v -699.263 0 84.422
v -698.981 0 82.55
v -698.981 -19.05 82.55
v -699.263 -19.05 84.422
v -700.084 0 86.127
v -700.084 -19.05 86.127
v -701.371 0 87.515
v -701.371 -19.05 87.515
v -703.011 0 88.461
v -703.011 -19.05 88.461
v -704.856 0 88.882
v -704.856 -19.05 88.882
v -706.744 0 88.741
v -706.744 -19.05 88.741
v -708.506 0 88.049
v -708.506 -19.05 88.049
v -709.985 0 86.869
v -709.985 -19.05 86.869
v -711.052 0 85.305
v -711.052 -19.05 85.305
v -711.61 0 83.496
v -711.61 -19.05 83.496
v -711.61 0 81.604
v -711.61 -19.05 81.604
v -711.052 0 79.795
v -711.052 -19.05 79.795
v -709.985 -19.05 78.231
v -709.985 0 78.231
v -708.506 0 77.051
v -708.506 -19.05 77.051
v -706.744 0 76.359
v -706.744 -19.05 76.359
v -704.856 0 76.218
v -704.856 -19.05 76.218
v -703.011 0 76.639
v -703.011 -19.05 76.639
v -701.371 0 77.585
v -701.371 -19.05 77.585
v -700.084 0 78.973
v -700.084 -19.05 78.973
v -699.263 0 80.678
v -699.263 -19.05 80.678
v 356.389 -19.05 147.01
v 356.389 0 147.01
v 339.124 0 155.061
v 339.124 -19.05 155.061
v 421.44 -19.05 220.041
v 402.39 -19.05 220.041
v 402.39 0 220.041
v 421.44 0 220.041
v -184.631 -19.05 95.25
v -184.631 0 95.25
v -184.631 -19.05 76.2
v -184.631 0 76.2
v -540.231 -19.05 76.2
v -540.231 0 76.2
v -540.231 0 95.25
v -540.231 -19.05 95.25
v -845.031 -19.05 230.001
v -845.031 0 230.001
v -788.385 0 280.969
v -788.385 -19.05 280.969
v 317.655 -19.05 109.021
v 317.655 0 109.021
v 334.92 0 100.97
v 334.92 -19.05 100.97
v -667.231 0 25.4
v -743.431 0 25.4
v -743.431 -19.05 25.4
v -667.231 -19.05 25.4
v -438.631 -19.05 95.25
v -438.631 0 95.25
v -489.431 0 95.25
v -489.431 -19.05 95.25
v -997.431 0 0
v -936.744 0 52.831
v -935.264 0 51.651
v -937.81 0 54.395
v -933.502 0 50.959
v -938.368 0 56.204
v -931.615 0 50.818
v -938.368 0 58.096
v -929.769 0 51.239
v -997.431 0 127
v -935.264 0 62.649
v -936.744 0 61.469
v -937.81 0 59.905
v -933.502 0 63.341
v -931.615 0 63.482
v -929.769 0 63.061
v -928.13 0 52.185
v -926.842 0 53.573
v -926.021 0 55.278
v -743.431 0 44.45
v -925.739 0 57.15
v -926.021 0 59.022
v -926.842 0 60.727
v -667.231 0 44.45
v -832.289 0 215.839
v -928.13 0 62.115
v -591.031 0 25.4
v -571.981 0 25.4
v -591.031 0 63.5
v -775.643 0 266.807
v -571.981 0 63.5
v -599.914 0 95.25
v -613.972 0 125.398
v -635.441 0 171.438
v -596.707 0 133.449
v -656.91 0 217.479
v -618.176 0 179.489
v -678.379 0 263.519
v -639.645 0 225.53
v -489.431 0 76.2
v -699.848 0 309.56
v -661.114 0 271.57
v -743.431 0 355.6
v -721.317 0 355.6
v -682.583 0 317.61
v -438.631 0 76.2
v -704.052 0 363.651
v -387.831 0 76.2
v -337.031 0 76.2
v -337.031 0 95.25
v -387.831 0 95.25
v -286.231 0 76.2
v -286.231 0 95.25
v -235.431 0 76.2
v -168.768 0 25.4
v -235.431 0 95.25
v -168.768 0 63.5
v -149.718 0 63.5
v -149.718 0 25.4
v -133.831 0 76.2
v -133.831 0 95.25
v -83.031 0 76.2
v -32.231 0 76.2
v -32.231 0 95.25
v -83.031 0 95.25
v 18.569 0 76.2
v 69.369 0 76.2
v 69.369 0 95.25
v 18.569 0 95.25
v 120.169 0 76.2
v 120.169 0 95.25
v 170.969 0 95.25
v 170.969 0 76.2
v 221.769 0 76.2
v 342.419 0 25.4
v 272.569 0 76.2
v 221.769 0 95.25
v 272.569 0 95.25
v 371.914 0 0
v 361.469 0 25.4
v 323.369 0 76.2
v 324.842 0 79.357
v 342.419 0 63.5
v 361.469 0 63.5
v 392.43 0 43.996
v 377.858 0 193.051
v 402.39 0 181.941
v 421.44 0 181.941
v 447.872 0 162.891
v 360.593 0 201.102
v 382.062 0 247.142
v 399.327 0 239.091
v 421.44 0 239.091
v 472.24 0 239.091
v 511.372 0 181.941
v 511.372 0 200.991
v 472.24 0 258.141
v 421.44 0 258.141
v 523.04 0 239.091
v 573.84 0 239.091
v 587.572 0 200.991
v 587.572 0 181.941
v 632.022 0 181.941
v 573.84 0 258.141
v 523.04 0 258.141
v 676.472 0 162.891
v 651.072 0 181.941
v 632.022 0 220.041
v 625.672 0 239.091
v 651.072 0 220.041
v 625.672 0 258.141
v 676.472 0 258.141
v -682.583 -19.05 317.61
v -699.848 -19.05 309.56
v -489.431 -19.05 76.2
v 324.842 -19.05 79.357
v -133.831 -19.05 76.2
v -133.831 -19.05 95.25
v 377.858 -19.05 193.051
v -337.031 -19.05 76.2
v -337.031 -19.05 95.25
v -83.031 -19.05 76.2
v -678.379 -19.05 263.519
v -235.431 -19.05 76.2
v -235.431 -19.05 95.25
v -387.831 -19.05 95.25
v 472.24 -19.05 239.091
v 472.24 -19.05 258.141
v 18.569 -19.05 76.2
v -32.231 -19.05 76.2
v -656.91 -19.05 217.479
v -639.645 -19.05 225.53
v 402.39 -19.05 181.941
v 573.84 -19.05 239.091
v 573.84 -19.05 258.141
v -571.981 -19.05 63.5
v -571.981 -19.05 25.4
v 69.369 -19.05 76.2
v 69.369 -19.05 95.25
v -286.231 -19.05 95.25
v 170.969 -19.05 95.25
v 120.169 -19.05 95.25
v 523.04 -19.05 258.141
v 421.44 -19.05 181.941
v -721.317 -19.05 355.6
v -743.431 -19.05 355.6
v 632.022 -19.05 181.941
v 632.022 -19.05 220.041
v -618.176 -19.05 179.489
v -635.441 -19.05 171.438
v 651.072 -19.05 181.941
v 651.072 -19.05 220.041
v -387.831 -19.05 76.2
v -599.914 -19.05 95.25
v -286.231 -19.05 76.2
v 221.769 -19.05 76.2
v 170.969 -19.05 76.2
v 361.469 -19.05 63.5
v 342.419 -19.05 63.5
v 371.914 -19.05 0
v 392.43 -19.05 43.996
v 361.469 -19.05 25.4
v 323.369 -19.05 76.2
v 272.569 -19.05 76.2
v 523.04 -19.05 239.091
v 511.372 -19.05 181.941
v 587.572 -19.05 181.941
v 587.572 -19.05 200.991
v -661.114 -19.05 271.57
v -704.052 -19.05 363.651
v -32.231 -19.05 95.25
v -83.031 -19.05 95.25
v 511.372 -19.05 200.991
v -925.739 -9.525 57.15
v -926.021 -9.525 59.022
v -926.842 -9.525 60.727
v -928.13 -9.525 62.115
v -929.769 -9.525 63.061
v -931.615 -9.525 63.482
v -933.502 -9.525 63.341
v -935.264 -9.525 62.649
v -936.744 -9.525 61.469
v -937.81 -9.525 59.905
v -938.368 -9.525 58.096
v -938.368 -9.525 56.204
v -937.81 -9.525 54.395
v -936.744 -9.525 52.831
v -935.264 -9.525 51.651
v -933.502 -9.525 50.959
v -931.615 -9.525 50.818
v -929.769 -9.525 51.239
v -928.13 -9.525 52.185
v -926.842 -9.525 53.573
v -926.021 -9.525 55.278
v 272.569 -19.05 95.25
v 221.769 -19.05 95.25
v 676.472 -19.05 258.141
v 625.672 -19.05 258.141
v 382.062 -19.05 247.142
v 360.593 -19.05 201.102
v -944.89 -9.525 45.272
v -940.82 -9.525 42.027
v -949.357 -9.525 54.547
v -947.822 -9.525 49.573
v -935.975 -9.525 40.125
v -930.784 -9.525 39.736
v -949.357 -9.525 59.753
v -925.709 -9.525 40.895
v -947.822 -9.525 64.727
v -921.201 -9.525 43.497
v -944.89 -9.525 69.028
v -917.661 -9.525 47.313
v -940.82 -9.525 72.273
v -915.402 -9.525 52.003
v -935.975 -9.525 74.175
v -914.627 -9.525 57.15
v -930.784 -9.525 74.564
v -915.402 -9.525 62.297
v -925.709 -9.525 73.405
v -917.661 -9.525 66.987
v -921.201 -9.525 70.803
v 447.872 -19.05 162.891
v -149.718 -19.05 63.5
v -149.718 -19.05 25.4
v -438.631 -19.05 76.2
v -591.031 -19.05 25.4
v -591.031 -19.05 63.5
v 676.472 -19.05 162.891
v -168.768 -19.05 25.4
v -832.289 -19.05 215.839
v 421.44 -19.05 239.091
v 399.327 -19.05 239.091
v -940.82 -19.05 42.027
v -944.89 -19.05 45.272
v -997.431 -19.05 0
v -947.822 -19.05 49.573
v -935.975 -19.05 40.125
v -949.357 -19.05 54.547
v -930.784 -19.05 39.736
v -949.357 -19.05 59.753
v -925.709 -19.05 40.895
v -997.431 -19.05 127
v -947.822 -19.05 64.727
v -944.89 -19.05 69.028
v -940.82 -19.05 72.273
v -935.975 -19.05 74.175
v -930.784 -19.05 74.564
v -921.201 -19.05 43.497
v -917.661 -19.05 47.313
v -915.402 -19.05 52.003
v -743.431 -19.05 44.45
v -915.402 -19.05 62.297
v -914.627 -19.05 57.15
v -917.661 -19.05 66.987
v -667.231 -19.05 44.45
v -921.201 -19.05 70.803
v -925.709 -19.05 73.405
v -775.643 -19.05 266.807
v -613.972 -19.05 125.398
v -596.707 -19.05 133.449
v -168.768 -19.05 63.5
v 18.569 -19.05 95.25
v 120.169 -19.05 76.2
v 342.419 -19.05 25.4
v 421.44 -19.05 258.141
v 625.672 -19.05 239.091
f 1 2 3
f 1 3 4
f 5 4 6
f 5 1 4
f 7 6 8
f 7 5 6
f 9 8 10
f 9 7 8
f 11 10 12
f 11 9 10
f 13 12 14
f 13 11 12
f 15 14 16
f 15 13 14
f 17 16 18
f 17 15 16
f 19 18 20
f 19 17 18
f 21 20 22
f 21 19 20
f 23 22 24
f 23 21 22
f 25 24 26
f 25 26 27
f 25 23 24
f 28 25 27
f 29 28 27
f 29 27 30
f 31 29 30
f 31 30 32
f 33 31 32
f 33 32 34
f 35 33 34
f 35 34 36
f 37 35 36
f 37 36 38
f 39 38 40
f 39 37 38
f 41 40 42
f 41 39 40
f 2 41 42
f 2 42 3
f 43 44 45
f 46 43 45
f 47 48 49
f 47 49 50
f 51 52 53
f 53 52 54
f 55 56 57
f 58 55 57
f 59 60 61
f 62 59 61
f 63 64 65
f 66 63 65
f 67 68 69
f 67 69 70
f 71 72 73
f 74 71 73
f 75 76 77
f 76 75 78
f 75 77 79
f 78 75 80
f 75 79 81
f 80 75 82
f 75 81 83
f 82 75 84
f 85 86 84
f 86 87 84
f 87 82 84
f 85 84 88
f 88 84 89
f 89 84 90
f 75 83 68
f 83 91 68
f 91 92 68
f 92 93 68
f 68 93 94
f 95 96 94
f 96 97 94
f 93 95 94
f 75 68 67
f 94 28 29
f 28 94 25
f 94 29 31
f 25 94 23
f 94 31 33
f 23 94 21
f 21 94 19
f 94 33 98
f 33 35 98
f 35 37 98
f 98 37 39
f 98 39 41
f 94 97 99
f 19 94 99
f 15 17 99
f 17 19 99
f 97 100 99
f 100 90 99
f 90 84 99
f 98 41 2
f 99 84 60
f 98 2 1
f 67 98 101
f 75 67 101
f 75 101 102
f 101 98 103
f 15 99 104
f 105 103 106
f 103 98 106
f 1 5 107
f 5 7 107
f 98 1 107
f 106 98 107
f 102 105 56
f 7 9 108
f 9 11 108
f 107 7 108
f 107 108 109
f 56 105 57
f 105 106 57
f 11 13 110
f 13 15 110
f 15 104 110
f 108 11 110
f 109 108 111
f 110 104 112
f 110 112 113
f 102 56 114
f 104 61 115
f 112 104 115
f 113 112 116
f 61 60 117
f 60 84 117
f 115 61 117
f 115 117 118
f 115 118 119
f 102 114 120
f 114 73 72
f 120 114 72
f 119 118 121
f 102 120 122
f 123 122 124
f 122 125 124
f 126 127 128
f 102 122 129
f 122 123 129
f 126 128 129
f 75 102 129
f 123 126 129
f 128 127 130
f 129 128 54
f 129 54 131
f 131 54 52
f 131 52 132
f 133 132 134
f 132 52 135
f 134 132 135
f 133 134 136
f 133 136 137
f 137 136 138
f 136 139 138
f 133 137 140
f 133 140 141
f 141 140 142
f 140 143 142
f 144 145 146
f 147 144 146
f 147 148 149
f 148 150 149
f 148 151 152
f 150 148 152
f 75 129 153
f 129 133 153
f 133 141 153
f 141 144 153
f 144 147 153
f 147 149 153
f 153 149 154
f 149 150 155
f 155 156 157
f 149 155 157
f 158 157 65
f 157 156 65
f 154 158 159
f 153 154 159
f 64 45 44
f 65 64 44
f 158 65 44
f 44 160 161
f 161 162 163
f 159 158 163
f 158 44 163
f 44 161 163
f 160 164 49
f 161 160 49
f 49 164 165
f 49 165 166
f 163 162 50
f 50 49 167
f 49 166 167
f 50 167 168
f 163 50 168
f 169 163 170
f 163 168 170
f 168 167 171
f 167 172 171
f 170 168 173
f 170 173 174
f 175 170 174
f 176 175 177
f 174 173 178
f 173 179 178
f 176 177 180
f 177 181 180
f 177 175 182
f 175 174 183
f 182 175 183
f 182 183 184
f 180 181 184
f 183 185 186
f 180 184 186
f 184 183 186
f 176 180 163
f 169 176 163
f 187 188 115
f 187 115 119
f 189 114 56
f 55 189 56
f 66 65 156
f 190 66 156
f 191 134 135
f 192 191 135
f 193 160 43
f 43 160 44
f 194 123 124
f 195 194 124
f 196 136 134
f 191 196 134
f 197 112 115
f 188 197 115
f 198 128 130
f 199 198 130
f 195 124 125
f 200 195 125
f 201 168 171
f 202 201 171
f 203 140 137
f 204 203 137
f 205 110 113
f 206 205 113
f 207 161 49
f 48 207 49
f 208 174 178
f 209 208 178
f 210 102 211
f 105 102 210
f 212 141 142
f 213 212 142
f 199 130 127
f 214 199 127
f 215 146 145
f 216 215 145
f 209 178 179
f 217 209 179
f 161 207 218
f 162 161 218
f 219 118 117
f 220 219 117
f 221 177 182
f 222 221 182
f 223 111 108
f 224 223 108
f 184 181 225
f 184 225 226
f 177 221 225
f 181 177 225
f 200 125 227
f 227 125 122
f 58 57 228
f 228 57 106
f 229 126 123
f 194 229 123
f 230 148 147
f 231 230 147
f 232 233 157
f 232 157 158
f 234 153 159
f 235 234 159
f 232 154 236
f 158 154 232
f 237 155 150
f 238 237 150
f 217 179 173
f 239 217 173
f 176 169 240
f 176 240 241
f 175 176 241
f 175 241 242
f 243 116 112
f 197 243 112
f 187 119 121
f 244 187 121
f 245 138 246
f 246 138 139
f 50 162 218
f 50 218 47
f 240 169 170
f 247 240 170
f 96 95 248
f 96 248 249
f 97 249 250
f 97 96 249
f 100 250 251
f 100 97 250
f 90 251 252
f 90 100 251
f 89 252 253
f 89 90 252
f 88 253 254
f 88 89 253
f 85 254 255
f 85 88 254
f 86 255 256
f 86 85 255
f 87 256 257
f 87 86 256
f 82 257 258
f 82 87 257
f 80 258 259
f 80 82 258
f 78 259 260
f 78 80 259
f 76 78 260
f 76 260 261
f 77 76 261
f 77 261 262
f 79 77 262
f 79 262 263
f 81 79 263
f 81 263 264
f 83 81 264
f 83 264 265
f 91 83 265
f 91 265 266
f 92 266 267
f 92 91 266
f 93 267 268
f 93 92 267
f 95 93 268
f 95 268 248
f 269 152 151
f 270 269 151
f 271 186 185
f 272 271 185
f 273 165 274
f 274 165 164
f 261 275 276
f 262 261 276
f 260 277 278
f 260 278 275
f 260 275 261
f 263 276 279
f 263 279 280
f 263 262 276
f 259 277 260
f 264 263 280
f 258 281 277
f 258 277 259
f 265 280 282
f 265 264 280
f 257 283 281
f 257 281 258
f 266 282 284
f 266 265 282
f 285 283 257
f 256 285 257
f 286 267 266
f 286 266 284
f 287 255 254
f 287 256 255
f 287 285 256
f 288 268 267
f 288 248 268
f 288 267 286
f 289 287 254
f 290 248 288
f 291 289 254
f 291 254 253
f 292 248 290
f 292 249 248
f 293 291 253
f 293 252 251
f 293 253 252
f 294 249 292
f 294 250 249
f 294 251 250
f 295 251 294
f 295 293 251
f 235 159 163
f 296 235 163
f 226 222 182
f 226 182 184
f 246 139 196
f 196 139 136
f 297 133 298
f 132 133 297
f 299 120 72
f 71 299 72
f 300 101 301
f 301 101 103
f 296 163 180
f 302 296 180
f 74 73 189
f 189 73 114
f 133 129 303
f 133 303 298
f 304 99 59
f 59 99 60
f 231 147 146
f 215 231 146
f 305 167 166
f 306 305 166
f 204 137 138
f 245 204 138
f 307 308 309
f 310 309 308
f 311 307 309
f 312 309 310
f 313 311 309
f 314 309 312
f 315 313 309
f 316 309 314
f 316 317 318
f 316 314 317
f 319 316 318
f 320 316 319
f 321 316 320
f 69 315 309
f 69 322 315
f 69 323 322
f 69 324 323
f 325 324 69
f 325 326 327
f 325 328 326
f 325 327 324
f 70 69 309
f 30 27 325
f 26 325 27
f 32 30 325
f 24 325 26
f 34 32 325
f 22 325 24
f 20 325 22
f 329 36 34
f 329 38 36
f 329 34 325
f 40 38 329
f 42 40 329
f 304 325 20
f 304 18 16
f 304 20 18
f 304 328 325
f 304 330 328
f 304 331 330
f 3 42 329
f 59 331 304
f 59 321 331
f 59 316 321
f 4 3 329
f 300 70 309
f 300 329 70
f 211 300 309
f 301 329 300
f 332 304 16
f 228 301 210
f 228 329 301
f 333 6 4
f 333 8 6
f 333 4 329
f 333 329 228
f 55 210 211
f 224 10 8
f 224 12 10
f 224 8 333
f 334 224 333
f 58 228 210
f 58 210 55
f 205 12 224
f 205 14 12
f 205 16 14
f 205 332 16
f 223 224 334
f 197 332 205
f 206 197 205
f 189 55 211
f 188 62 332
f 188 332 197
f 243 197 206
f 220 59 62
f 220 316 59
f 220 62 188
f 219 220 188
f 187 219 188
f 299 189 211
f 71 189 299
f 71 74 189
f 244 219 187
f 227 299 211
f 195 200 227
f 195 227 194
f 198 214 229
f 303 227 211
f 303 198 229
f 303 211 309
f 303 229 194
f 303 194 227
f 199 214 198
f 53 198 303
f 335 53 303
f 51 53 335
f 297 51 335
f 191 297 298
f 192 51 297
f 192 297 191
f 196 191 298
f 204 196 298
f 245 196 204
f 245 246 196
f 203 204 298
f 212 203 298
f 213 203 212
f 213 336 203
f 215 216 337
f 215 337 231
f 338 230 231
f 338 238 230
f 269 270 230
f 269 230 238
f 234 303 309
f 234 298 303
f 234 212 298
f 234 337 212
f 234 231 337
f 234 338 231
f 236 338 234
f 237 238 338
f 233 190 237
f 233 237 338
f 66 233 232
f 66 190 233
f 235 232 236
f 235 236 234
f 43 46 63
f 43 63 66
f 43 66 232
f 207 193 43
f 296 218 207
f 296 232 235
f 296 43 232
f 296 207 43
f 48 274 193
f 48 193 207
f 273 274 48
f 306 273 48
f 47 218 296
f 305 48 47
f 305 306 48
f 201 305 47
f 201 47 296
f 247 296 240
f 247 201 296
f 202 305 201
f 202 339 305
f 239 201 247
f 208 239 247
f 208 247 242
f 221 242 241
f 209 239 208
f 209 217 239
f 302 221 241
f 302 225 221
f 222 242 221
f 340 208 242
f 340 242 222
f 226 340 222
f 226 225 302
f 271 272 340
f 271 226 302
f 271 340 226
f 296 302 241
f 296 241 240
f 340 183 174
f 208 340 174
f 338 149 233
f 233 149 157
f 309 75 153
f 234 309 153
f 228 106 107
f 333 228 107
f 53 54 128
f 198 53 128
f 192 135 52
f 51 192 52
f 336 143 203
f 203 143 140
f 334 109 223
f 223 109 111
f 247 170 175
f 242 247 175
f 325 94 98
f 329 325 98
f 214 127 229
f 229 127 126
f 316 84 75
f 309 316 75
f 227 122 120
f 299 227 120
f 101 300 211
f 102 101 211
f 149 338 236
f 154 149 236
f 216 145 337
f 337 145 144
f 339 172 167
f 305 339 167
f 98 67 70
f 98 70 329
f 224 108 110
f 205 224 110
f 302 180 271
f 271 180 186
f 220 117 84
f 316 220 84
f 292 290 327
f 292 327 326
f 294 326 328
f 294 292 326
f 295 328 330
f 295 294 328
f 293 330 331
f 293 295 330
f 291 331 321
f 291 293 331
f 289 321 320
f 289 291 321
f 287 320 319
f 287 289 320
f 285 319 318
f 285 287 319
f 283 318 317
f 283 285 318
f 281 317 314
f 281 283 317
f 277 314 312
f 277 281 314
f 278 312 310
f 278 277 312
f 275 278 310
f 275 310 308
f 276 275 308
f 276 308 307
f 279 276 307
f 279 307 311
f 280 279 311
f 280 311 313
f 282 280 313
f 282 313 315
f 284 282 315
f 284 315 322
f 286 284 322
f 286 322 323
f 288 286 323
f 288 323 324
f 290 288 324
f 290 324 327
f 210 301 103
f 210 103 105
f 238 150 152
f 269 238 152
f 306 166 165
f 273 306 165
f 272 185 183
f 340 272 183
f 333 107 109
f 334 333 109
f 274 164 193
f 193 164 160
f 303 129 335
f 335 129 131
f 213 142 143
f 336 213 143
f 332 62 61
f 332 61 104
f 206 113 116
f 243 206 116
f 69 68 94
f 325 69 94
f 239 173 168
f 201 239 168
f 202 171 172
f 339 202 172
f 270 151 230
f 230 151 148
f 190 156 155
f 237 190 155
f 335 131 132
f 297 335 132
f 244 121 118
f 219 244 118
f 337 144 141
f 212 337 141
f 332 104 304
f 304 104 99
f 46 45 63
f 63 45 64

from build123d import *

# Parameters (mm, degrees)
F0_W     = 76.2
F0_H     = 19.05
F0_W_2   = 19.05
F0_H_2   = 38.1
F0_R     = 17.4625
F0_R_2   = 6.35
F1_DEPTH = 19.05
F2_DEPTH = 9.525


with BuildPart() as f1:
    # F0 (on Front) → F1 (new body)
    with BuildSketch(Plane.XZ):
        Polygon((-489.430563, 76.2), (-540.230563, 76.2), (-540.230563, 95.25), (-591.030563, 95.25), (-599.913724, 95.25), (-613.971884, 125.397822), (-596.706721, 133.4487), (-618.175729, 179.489136), (-635.440892, 171.438258), (-656.9099, 217.478693), (-639.644736, 225.529571), (-661.113744, 271.570007), (-678.378907, 263.519129), (-699.847915, 309.559564), (-682.582752, 317.610442), (-704.051759, 363.650878), (-721.316923, 355.6), (-743.430563, 355.6), (-997.430563, 127), (-997.430563, 0), (-591.030563, 0), (342.419437, 0), (371.914191, 0), (392.43009, 43.996488), (447.87154, 162.891061), (502.200551, 162.891061), (676.47154, 162.891061), (676.47154, 239.091061), (676.47154, 258.141061), (625.67154, 258.141061), (625.67154, 239.091061), (573.840427, 239.091061), (573.840427, 258.141061), (523.040427, 258.141061), (523.040427, 239.091061), (472.240427, 239.091061), (472.240427, 258.141061), (421.440427, 258.141061), (421.440427, 239.091061), (399.326786, 239.091061), (382.061623, 247.141939), (360.592615, 201.101503), (377.857779, 193.050626), (356.388771, 147.01019), (339.123608, 155.061068), (317.6546, 109.020632), (334.919763, 100.969754), (324.841751, 79.357387), (323.369437, 76.2), (272.569437, 76.2), (272.569437, 95.25), (221.769437, 95.25), (221.769437, 76.2), (170.969437, 76.2), (170.969437, 95.25), (120.169437, 95.25), (120.169437, 76.2), (69.369437, 76.2), (69.369437, 95.25), (18.569437, 95.25), (18.569437, 76.2), (-32.230563, 76.2), (-32.230563, 95.25), (-83.030563, 95.25), (-83.030563, 76.2), (-133.830563, 76.2), (-133.830563, 95.25), (-184.630563, 95.25), (-184.630563, 76.2), (-235.430563, 76.2), (-235.430563, 95.25), (-286.230563, 95.25), (-286.230563, 76.2), (-337.030563, 76.2), (-337.030563, 95.25), (-387.830563, 95.25), (-387.830563, 76.2), (-438.630563, 76.2), (-438.630563, 95.25), (-489.430563, 95.25), align=None)
        with Locations((-705.330563, 34.925)):
            Rectangle(F0_W, F0_H, mode=Mode.SUBTRACT)
        with Locations((-581.505563, 44.45)):
            Rectangle(F0_W_2, F0_H_2, mode=Mode.SUBTRACT)
        with Locations((-932.089063, 57.15)):
            Circle(F0_R, mode=Mode.SUBTRACT)
        with Locations((-705.330563, 82.55)):
            Circle(F0_R_2, mode=Mode.SUBTRACT)
        with Locations((-159.243268, 44.45)):
            Rectangle(F0_W_2, F0_H_2, mode=Mode.SUBTRACT)
        with Locations((351.944437, 44.45)):
            Rectangle(F0_W_2, F0_H_2, mode=Mode.SUBTRACT)
        Polygon((-832.288567, 215.839342), (-845.030563, 230.0007), (-788.385133, 280.968682), (-775.643137, 266.807325), align=None, mode=Mode.SUBTRACT)
        with Locations((411.915427, 200.991061)):
            Rectangle(F0_W_2, F0_H_2, mode=Mode.SUBTRACT)
        with Locations((549.47154, 191.466061)):
            Rectangle(F0_W, F0_H, mode=Mode.SUBTRACT)
        with Locations((641.54654, 200.991061)):
            Rectangle(F0_W_2, F0_H_2, mode=Mode.SUBTRACT)
    extrude(amount=F1_DEPTH)

    # F0 (on Front) → F2 (join)
    with BuildSketch(Plane.XZ):
        with Locations((-932.089063, 57.15)):
            Circle(F0_R)
        with Locations((-932.089063, 57.15)):
            Circle(F0_R_2, mode=Mode.SUBTRACT)
    extrude(amount=F2_DEPTH)


solid = f1.part
